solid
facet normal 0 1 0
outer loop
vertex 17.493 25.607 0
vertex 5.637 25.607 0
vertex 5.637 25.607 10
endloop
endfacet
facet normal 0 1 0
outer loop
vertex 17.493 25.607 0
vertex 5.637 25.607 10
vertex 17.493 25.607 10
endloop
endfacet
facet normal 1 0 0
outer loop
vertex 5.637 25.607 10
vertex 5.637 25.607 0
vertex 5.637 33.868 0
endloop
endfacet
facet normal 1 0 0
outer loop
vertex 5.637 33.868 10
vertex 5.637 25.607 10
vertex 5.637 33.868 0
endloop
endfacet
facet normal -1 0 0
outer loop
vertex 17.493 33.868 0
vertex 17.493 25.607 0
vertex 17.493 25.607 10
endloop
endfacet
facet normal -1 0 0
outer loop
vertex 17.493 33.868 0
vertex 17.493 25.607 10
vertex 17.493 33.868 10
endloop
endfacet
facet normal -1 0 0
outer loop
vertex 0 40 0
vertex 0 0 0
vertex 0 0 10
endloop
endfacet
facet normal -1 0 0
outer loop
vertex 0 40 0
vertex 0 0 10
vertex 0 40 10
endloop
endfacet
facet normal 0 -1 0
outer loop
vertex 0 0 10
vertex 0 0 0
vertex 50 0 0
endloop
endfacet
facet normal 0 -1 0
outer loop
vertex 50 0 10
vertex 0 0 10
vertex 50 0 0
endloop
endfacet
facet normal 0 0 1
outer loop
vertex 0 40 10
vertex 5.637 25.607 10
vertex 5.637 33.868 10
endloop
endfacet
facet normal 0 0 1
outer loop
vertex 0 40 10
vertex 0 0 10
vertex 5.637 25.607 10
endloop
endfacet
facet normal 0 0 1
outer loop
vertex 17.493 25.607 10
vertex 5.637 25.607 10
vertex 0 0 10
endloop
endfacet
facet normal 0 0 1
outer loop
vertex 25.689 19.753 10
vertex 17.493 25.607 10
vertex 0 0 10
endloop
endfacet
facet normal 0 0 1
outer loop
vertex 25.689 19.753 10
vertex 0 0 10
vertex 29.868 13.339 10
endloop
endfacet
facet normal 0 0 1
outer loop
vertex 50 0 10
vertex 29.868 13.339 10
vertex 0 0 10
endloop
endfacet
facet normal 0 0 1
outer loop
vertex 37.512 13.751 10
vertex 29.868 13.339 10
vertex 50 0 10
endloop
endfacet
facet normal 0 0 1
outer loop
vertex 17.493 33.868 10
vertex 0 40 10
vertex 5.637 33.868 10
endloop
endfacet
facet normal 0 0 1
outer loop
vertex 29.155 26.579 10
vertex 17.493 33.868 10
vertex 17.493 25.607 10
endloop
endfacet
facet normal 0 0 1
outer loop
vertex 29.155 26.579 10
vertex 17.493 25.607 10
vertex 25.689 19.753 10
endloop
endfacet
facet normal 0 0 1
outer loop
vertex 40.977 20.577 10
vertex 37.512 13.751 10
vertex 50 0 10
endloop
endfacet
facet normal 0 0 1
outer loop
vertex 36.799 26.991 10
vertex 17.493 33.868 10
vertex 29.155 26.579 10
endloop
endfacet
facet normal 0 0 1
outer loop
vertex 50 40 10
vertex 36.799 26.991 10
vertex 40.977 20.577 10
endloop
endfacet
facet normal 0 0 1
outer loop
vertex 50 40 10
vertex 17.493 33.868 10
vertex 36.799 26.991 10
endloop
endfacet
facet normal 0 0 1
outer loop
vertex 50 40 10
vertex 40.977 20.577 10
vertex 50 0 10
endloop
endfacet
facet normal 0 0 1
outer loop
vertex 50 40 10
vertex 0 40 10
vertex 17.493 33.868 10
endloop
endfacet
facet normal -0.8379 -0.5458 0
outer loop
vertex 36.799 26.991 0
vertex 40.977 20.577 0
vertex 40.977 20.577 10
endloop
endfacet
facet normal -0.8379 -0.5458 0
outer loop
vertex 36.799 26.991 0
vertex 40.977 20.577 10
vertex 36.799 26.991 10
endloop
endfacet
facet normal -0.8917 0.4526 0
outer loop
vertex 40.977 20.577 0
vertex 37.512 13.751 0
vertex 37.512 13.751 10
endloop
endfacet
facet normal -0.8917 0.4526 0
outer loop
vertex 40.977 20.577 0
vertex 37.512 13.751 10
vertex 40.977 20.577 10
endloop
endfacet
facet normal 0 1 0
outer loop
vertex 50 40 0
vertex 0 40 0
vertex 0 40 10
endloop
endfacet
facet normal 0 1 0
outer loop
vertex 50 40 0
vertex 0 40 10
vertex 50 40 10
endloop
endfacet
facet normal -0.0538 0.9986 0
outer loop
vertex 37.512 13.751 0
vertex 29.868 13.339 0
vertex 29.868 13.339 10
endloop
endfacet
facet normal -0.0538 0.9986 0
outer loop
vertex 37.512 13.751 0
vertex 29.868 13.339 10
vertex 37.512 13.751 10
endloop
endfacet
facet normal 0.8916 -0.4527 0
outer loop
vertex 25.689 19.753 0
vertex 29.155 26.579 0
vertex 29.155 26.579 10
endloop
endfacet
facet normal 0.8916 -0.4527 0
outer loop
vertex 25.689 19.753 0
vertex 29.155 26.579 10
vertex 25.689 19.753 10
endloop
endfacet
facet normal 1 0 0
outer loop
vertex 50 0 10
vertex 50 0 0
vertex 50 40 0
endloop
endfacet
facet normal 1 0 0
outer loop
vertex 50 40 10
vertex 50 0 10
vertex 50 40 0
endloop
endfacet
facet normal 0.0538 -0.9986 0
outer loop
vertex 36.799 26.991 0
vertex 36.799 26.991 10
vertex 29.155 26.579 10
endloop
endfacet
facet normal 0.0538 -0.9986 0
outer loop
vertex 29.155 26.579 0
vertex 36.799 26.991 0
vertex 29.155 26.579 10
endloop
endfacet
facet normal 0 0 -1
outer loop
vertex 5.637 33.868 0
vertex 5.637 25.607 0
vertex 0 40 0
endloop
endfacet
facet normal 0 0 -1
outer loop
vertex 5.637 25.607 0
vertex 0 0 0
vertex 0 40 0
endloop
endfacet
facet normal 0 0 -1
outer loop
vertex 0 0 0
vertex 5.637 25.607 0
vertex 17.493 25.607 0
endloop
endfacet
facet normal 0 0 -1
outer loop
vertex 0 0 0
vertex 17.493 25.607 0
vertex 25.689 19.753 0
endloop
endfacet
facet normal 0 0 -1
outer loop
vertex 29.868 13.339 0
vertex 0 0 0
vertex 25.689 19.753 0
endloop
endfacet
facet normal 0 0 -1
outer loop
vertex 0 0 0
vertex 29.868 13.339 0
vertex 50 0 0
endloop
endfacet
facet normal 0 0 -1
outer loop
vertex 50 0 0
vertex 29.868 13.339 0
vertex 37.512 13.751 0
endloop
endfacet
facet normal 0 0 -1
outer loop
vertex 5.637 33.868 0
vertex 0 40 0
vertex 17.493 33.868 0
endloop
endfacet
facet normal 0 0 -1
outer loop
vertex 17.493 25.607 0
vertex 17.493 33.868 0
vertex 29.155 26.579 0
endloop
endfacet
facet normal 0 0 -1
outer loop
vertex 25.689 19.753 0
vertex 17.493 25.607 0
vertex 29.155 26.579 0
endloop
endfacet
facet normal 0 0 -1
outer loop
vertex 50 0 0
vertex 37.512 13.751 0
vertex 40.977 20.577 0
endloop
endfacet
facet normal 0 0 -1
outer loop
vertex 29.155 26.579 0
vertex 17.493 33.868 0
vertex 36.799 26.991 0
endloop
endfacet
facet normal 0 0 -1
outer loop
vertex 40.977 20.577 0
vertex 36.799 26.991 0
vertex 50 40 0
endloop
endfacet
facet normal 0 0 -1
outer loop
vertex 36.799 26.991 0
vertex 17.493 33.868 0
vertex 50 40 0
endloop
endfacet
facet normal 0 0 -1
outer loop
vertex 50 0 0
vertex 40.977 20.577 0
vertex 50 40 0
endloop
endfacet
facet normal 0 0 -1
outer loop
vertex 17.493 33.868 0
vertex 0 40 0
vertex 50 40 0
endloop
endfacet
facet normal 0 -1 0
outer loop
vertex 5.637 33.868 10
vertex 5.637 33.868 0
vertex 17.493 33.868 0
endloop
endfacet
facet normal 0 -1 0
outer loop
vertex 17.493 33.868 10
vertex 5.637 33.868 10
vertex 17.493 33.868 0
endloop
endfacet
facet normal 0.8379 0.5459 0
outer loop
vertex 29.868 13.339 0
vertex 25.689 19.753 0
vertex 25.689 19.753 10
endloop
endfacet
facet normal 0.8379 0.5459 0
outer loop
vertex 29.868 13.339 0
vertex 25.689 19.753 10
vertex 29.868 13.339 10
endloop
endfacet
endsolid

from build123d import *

# Parameters (mm, degrees)
SKETCH_W   = 50
SKETCH_H   = 40
SKETCH_W_2 = 11.856175
SKETCH_H_2 = 8.260444
PAD_DEPTH  = 10


with BuildPart() as part:
    # Sketch → Pad (new body)
    with BuildSketch(Plane.XY):
        with Locations((25, 20)):
            Rectangle(SKETCH_W, SKETCH_H)
        with Locations((11.564625, 29.737606)):
            Rectangle(SKETCH_W_2, SKETCH_H_2, mode=Mode.SUBTRACT)
        Polygon((37.512146, 13.751215), (40.977424, 20.577169), (36.798614, 26.991165), (29.154526, 26.579207), (25.689248, 19.753253), (29.868058, 13.339257), align=None, mode=Mode.SUBTRACT)
    extrude(amount=PAD_DEPTH)


solid = part.part
